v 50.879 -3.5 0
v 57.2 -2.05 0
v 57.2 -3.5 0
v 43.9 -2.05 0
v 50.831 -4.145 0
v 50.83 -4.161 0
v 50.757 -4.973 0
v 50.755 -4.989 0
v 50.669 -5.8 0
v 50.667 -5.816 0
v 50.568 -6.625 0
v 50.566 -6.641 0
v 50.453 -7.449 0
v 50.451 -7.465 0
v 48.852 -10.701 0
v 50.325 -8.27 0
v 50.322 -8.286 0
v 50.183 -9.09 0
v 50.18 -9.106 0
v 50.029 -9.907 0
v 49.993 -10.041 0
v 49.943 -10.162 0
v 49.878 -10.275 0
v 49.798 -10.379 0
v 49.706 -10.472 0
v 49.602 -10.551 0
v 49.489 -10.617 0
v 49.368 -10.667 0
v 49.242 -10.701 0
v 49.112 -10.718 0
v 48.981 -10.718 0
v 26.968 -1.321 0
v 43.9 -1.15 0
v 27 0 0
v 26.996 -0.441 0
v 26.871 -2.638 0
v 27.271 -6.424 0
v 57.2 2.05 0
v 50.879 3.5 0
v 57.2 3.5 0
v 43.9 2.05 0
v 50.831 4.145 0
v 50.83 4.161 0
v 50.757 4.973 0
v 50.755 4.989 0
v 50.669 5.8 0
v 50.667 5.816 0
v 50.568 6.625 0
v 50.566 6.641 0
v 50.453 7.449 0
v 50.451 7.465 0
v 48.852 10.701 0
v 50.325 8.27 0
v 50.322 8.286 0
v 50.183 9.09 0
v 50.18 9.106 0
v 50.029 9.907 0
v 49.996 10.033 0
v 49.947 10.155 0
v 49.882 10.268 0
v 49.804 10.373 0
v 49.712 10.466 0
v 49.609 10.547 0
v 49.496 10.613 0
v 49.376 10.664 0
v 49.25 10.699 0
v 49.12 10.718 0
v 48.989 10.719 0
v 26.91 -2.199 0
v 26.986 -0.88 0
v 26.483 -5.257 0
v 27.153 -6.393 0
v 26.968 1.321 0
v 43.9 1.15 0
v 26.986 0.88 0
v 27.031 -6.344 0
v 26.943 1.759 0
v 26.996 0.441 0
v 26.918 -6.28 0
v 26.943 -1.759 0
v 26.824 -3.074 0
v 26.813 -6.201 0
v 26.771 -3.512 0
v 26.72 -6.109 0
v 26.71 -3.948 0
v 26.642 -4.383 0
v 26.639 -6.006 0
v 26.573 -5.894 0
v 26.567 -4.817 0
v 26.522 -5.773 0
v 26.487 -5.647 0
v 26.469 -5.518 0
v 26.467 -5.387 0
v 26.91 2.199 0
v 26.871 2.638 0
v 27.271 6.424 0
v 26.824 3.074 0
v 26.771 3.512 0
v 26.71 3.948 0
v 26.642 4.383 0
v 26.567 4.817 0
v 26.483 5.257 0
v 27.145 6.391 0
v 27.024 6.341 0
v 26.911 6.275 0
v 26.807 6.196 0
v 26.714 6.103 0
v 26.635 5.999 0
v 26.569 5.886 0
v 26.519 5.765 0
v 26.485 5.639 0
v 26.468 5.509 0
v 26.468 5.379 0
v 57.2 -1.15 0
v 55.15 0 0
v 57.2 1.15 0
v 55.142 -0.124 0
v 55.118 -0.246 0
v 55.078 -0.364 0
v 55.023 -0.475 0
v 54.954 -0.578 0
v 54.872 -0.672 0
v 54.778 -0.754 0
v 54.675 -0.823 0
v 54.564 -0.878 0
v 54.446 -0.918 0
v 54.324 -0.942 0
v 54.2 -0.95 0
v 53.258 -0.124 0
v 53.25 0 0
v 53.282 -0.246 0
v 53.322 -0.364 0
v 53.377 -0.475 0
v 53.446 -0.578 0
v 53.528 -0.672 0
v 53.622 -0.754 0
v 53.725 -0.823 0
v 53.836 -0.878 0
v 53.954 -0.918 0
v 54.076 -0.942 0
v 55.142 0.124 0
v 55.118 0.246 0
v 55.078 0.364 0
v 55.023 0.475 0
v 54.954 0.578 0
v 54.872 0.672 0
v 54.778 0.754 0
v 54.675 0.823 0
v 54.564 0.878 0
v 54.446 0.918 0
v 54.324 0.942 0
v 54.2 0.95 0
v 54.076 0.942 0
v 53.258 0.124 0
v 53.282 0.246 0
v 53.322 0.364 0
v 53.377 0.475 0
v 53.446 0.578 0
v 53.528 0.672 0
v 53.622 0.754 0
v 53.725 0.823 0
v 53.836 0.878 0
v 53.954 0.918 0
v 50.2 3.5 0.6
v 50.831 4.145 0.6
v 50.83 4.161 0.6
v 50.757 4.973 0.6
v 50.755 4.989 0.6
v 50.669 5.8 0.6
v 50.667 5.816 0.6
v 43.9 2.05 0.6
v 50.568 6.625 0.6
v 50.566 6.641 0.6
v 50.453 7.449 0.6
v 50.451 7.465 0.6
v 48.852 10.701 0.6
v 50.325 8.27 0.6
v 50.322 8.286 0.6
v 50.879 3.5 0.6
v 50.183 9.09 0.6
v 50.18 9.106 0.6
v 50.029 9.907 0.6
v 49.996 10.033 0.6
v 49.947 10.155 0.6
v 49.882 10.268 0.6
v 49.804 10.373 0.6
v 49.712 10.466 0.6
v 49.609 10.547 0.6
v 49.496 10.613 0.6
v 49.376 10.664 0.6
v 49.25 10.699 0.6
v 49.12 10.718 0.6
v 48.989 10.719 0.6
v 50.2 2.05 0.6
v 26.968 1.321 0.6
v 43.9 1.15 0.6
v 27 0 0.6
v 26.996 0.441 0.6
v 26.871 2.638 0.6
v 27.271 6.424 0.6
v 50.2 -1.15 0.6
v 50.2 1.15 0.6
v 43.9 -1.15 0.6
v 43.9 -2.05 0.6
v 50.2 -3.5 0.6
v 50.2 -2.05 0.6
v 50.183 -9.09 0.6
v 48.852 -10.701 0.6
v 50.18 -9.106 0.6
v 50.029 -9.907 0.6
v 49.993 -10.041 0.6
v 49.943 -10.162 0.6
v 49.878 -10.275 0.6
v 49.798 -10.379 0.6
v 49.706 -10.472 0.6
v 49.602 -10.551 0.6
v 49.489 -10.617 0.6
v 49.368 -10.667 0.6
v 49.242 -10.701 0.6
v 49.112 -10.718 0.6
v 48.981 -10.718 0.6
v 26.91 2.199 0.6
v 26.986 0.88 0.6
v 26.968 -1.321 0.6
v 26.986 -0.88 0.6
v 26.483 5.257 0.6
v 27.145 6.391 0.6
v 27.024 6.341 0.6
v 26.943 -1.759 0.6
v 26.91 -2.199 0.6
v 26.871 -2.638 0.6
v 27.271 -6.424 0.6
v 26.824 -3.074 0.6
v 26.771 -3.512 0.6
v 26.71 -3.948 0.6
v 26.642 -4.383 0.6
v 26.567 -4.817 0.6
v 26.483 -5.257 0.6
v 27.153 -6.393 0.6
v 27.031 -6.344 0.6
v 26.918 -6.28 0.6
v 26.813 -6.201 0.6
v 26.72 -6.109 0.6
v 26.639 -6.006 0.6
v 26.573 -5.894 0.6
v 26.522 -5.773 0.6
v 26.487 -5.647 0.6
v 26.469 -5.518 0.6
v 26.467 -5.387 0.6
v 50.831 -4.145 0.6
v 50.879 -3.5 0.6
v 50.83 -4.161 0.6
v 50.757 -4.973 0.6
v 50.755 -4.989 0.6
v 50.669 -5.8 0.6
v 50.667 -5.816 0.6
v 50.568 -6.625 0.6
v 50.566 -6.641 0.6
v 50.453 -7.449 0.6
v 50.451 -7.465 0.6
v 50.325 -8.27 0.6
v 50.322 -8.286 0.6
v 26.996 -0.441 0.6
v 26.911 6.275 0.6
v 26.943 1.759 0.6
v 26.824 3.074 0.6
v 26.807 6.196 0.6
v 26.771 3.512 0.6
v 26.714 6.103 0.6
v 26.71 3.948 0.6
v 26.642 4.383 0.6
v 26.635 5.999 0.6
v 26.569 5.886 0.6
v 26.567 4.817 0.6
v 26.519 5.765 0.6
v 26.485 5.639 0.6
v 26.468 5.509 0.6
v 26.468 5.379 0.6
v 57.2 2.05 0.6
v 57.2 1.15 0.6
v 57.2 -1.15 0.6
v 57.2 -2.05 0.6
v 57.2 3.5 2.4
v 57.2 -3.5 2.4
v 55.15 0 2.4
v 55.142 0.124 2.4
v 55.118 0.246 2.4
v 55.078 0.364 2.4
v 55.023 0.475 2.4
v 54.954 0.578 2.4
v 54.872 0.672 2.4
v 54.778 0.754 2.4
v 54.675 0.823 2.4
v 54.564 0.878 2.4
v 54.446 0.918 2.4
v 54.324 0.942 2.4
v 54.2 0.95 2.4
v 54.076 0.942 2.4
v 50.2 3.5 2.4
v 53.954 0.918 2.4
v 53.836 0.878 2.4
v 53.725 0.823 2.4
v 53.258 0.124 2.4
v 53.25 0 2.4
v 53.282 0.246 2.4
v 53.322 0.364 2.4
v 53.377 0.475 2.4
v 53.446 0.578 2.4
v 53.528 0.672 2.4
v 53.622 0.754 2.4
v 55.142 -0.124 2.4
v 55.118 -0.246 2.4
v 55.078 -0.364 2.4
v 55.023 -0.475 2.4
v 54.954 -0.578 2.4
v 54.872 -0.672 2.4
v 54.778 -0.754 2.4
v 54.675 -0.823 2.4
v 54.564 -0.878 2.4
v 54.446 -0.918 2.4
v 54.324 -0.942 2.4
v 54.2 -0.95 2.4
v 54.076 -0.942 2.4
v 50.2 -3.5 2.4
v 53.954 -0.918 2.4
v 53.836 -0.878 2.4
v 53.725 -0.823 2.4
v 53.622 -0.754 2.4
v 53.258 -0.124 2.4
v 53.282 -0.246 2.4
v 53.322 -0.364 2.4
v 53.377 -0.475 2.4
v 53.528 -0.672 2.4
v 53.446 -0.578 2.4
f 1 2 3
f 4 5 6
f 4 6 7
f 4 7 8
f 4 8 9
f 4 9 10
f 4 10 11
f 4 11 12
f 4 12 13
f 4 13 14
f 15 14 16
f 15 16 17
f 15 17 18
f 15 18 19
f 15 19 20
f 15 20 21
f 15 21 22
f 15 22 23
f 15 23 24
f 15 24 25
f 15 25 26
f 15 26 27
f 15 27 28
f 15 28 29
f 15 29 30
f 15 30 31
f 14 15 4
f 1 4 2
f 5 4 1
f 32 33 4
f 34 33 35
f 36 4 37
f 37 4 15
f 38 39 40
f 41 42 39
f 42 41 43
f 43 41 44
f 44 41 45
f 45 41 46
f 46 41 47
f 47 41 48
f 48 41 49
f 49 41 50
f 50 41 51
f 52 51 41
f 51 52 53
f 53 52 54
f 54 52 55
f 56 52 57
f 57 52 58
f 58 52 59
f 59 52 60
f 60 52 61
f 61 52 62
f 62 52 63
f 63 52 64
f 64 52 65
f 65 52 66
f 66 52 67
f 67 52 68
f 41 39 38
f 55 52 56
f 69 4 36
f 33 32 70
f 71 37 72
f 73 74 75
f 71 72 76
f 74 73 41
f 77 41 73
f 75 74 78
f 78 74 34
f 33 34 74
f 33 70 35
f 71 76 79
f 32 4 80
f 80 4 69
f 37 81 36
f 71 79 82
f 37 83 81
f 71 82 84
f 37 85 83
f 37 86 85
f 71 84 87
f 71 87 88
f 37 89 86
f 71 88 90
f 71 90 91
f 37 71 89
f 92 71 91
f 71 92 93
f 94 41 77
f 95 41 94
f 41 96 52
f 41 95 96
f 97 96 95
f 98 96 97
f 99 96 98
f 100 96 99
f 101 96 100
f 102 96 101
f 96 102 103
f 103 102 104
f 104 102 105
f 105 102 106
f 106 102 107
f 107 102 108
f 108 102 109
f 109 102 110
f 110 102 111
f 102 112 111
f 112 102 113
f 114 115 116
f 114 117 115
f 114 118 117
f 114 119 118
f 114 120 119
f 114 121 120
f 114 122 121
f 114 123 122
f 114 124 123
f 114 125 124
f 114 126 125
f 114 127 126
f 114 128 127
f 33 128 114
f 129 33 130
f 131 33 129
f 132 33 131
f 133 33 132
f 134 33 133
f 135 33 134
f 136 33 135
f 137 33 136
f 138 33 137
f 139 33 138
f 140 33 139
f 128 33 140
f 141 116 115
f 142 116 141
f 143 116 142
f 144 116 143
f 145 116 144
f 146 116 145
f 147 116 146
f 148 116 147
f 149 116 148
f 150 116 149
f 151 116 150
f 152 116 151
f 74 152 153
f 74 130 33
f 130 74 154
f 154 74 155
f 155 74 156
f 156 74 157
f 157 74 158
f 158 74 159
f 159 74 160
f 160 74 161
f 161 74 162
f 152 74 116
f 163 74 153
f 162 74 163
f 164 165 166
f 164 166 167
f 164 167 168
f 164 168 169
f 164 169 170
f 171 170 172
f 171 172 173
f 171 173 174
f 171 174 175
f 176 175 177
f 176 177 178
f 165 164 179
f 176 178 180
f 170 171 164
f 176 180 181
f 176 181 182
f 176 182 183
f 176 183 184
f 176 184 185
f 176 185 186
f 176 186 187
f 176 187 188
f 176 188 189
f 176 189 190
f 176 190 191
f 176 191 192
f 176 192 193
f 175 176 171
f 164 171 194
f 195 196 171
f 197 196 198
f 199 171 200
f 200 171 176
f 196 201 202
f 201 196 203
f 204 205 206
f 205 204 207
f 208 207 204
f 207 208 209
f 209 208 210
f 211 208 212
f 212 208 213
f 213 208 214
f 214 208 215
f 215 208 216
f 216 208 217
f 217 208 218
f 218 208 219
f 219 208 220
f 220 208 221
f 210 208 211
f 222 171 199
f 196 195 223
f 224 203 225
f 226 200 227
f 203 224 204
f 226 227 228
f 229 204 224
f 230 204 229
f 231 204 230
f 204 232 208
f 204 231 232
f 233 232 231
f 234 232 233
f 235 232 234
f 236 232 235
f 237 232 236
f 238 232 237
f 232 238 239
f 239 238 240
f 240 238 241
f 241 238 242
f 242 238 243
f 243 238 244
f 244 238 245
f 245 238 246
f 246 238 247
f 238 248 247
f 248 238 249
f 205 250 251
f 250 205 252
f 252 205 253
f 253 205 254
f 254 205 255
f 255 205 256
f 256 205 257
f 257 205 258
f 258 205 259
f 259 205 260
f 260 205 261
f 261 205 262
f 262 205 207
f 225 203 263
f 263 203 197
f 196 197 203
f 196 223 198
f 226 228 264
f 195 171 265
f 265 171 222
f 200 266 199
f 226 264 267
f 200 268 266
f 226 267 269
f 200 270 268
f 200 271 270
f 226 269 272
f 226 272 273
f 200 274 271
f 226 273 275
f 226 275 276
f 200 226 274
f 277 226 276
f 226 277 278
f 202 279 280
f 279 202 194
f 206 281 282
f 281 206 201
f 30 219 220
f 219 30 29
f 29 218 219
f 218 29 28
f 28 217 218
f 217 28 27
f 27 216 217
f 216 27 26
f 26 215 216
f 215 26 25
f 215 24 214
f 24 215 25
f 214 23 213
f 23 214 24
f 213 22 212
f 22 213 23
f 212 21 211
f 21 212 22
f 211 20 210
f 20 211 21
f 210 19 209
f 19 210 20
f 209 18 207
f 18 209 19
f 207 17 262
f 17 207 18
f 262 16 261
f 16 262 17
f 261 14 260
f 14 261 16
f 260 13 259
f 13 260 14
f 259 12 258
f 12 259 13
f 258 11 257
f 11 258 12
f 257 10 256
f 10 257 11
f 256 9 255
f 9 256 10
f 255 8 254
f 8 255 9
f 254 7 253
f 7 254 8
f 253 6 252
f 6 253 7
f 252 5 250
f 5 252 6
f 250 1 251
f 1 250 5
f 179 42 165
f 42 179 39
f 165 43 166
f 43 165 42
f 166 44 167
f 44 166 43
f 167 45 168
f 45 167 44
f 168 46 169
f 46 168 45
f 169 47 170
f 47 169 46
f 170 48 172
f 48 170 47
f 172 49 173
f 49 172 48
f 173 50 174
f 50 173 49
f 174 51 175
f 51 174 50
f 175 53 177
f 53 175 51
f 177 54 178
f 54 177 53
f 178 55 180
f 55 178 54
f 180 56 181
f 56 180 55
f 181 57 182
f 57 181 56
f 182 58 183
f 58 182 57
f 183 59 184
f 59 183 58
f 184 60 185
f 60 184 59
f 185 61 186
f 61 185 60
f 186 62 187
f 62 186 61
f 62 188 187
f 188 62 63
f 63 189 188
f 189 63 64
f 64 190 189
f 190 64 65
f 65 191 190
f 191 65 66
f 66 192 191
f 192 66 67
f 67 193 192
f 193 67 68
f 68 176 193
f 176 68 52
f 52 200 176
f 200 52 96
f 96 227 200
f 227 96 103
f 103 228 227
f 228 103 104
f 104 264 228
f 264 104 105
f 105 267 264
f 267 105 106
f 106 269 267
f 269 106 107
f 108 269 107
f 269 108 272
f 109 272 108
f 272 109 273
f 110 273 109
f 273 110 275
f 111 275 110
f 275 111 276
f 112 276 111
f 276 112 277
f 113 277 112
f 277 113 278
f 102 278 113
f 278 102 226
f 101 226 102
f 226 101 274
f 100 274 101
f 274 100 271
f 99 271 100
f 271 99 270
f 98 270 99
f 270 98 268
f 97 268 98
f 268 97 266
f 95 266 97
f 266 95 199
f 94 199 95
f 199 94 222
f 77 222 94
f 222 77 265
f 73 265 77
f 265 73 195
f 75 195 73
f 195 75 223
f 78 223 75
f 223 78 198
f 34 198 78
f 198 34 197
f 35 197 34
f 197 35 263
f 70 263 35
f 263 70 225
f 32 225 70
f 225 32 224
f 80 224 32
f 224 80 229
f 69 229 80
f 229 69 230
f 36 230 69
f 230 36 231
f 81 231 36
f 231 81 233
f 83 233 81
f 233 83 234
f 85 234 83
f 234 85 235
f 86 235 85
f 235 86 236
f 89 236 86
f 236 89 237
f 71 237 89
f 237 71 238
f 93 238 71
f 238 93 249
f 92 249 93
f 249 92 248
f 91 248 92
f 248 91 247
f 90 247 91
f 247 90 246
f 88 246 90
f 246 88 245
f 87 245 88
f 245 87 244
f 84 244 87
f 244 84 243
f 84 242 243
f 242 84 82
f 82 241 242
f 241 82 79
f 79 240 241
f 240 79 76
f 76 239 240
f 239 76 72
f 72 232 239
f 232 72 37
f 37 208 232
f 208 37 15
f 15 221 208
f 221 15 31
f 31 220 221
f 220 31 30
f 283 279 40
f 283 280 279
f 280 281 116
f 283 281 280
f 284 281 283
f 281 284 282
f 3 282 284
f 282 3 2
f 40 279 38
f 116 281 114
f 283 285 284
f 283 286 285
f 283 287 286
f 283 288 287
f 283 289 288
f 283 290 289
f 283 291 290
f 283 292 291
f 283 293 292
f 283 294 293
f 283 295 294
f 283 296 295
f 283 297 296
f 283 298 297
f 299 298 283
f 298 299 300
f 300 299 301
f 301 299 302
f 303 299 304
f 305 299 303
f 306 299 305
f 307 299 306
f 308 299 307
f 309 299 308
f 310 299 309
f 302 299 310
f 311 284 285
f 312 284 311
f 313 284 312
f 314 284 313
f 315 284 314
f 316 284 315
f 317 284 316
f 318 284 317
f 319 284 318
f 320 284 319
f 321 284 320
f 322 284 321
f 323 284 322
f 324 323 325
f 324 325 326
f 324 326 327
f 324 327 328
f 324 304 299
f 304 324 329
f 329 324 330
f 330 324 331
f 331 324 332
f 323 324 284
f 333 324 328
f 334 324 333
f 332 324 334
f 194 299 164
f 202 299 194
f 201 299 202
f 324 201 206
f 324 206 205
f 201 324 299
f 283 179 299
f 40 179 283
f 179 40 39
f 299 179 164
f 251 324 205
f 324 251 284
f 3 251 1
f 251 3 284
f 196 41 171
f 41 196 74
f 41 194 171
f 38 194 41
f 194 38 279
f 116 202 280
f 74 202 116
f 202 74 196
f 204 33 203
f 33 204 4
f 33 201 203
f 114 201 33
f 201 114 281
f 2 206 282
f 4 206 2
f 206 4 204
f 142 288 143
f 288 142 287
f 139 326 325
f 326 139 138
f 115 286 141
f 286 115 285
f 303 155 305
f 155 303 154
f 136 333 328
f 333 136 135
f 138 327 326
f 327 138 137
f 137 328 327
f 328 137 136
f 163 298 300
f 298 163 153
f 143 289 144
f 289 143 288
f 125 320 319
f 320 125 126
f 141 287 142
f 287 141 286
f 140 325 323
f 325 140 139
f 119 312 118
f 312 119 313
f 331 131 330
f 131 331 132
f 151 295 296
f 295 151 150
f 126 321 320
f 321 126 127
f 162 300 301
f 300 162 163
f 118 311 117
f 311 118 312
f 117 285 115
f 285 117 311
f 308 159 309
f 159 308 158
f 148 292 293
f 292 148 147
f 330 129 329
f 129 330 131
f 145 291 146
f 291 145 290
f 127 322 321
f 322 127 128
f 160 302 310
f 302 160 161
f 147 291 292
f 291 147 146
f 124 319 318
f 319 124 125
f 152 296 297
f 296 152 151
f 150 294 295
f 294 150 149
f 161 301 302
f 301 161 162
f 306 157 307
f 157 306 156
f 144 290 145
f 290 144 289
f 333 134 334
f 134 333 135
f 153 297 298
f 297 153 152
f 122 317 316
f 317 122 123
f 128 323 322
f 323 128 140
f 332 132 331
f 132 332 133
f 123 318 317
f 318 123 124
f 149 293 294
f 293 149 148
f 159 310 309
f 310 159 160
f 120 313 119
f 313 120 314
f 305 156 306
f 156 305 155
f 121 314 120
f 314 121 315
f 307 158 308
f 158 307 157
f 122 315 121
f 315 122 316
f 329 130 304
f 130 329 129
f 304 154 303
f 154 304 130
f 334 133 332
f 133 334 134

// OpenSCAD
// file: parameters.scad
// =============================================================================
// Gen-BD — nightly 2026-10-03 (physics_scorer, honest magpylib watts)
// Clocking 0 deg (magnets N facing S) + D-flat keyed bore + index notch + flip-symmetric braces/bolts.
// Windable 2-piece bobbin; turns = physics_scorer turns_fit; copper only between flanges.
// former_web = 3.60 mm (taller copper vs Gen-BA 2.46) — gap grows with web (honest Bz tradeoff).
// Steel back-iron: two buyable mild-steel discs behind each rotor (score with --back-iron).
// =============================================================================
topology            = "dual_rotor";

// --- Wire / winding (physics_scorer winding-fit) -------------------------------
wire_awg            = 26;
wire_od             = 0.45;     // insulated OD mm (bare 0.405)
fill_realistic      = 0.60;     // insulated-wire area / window, hand-wound layered
turns               = 76;       // = physics_scorer turns_fit (do NOT raise)
coil_former_type    = "bobbin";
coil_core_inset     = 5.60;     // radial copper build: hub = copper boundary inset by this
wind_build_axial    = 0.0;      // nothing proud of the flanges
wind_build_radial   = 0.0;

// --- Bobbin (base + lid) ---------------------------------------------------------
coil_id_r           = 28.00;    // copper boundary sector (over the magnet track)
coil_od_r           = 50.00;
span_deg            = 22.42;    // = pitch - 2*asin((wall+0.85)/coil_id_r) -> >=1.2 mm stator web
former_web          = 3.60;     // copper height between flanges
flange_t            = 0.60;
wall                = 1.00;     // flange lip beyond copper
former_bare_h       = former_web + 2 * flange_t;
coil_envelope_h     = former_bare_h + 2 * wind_build_axial;
tab_w               = 7.0;
tab_len             = 7.0;
tab_h               = former_bare_h / 2;
pin_d               = 1.9;      // 1.75 mm filament locating pin
coil_mount_r        = coil_od_r + 0.2 + 4.0;
lead_y              = 1.6;
lead_slot_w         = 0.9;
lead_groove_d       = 0.6;

// --- Gap -------------------------------------------------------------------------
run_clear           = 0.50;     // rotor face -> flange
gap_spacer_h        = run_clear + wind_build_axial;
m2m                 = coil_envelope_h + 2 * run_clear;

// --- Stator ----------------------------------------------------------------------
coil_stations       = 12;
bay_clear           = 0.25;
stator_thick        = former_bare_h;                        // bobbins flush both faces
stator_od           = 162.0;
shaft_clear_stator  = 14.0;     // stator is static; shaft only

// --- Rotor(s) --------------------------------------------------------------------
magnet_Br           = 1.43;     // N52
halbach_magnetisation = "diametric"; // O5x5 assist magnets MUST be DIAMETRICALLY magnetised (tangential)
rotor_b_same_axis   = true;     // same-index magnets share one axis: N faces S across the gap
large_pocket_d      = 20.3;
small_pocket_d      = 5.3;
pocket_h            = 5.2;
large_n             = 8;
R_large             = 40.0;
R_small_inner       = 24.0;
R_small_mid         = 40.0;
R_small_outer       = 56.0;
carrier_od          = 160.0;
carrier_thick       = 7.5;
hub_h               = 10.0;
hub_od              = 30.0;
rotor_b_offset_deg  = 0.0;      // CLOCKING: magnets directly opposite
shaft_key           = "dflat";
dflat_depth         = 0.5;      // 8 mm shaft with 0.5 mm flat (7.5 across flat)
index_notch_d       = 3.0;

// --- Modular MAX interface (Gen-E family) -----------------------------------------
shaft_bore          = 8.35;
dflat_x             = 4.0 - dflat_depth + (shaft_bore - 8.0) / 2;
bearing_d           = 21.85;
bearing_h           = 7.2;
m3_clear            = 3.5;
bolt_r_inner        = 30.0;
bolt_n_inner        = 4;
bolt_inner_angles   = [22.5, -22.5, 157.5, 202.5];  // between poles, flip-symmetric
flange_bolt_r       = 72.0;
flange_bolt_n       = 6;
brace_r             = 68.0;
brace_d             = 4.3;
brace_n             = 4;
brace_angles        = [45, 135, 225, 315];          // flip-symmetric

spacer_pad_od       = 14.0;
spacer_pad_id       = m3_clear;
endbell_od          = 162.0;
endbell_thick       = 8.0;
endbell_shaft_clear = 10.0;
plate_max_mm        = 410;

$fn = 64;
// main file
// Gen-BD — bobbin LID (top flange + locating tab). Print x12, flange face DOWN on the bed.
// CA-glue onto the hub top BEFORE winding. Tab is the lap joint into the stator tab pocket; 1.75 mm
// filament pin through pin hole + stator ledge, trim flush. Lead slots carry both leads flush.
include <parameters.scad>;
$fn = 48;
module sector_2d(r_in, r_out, ang) {
    polygon([
        for (a = [-ang/2 : ang/24 : ang/2]) [r_in*cos(a), r_in*sin(a)],
        for (a = [ang/2 : -ang/24 : -ang/2]) [r_out*cos(a), r_out*sin(a)]
    ]);
}
module footprint_2d() { offset(r=wall) sector_2d(coil_id_r, coil_od_r, span_deg); }
module hub_2d()       { offset(delta=-coil_core_inset) sector_2d(coil_id_r, coil_od_r, span_deg); }

difference() {
    union() {
        linear_extrude(flange_t) footprint_2d();
        // tab block (outside the copper, r > coil_od_r) reaches down to former mid-height
        translate([coil_od_r + 0.2, -tab_w/2, 0]) cube([tab_len, tab_w, tab_h]);
    }
    translate([coil_mount_r, 0, -0.1]) cylinder(d=pin_d, h=tab_h + 1);
    // two lead grooves on the outer (rotor-facing) side, depth lead_groove_d
    for (y = [lead_y, -lead_y])
        translate([coil_od_r - coil_core_inset - 0.5, y - lead_slot_w/2, -0.1])
            cube([coil_core_inset + tab_len + 2, lead_slot_w, lead_groove_d + 0.1]);
}
